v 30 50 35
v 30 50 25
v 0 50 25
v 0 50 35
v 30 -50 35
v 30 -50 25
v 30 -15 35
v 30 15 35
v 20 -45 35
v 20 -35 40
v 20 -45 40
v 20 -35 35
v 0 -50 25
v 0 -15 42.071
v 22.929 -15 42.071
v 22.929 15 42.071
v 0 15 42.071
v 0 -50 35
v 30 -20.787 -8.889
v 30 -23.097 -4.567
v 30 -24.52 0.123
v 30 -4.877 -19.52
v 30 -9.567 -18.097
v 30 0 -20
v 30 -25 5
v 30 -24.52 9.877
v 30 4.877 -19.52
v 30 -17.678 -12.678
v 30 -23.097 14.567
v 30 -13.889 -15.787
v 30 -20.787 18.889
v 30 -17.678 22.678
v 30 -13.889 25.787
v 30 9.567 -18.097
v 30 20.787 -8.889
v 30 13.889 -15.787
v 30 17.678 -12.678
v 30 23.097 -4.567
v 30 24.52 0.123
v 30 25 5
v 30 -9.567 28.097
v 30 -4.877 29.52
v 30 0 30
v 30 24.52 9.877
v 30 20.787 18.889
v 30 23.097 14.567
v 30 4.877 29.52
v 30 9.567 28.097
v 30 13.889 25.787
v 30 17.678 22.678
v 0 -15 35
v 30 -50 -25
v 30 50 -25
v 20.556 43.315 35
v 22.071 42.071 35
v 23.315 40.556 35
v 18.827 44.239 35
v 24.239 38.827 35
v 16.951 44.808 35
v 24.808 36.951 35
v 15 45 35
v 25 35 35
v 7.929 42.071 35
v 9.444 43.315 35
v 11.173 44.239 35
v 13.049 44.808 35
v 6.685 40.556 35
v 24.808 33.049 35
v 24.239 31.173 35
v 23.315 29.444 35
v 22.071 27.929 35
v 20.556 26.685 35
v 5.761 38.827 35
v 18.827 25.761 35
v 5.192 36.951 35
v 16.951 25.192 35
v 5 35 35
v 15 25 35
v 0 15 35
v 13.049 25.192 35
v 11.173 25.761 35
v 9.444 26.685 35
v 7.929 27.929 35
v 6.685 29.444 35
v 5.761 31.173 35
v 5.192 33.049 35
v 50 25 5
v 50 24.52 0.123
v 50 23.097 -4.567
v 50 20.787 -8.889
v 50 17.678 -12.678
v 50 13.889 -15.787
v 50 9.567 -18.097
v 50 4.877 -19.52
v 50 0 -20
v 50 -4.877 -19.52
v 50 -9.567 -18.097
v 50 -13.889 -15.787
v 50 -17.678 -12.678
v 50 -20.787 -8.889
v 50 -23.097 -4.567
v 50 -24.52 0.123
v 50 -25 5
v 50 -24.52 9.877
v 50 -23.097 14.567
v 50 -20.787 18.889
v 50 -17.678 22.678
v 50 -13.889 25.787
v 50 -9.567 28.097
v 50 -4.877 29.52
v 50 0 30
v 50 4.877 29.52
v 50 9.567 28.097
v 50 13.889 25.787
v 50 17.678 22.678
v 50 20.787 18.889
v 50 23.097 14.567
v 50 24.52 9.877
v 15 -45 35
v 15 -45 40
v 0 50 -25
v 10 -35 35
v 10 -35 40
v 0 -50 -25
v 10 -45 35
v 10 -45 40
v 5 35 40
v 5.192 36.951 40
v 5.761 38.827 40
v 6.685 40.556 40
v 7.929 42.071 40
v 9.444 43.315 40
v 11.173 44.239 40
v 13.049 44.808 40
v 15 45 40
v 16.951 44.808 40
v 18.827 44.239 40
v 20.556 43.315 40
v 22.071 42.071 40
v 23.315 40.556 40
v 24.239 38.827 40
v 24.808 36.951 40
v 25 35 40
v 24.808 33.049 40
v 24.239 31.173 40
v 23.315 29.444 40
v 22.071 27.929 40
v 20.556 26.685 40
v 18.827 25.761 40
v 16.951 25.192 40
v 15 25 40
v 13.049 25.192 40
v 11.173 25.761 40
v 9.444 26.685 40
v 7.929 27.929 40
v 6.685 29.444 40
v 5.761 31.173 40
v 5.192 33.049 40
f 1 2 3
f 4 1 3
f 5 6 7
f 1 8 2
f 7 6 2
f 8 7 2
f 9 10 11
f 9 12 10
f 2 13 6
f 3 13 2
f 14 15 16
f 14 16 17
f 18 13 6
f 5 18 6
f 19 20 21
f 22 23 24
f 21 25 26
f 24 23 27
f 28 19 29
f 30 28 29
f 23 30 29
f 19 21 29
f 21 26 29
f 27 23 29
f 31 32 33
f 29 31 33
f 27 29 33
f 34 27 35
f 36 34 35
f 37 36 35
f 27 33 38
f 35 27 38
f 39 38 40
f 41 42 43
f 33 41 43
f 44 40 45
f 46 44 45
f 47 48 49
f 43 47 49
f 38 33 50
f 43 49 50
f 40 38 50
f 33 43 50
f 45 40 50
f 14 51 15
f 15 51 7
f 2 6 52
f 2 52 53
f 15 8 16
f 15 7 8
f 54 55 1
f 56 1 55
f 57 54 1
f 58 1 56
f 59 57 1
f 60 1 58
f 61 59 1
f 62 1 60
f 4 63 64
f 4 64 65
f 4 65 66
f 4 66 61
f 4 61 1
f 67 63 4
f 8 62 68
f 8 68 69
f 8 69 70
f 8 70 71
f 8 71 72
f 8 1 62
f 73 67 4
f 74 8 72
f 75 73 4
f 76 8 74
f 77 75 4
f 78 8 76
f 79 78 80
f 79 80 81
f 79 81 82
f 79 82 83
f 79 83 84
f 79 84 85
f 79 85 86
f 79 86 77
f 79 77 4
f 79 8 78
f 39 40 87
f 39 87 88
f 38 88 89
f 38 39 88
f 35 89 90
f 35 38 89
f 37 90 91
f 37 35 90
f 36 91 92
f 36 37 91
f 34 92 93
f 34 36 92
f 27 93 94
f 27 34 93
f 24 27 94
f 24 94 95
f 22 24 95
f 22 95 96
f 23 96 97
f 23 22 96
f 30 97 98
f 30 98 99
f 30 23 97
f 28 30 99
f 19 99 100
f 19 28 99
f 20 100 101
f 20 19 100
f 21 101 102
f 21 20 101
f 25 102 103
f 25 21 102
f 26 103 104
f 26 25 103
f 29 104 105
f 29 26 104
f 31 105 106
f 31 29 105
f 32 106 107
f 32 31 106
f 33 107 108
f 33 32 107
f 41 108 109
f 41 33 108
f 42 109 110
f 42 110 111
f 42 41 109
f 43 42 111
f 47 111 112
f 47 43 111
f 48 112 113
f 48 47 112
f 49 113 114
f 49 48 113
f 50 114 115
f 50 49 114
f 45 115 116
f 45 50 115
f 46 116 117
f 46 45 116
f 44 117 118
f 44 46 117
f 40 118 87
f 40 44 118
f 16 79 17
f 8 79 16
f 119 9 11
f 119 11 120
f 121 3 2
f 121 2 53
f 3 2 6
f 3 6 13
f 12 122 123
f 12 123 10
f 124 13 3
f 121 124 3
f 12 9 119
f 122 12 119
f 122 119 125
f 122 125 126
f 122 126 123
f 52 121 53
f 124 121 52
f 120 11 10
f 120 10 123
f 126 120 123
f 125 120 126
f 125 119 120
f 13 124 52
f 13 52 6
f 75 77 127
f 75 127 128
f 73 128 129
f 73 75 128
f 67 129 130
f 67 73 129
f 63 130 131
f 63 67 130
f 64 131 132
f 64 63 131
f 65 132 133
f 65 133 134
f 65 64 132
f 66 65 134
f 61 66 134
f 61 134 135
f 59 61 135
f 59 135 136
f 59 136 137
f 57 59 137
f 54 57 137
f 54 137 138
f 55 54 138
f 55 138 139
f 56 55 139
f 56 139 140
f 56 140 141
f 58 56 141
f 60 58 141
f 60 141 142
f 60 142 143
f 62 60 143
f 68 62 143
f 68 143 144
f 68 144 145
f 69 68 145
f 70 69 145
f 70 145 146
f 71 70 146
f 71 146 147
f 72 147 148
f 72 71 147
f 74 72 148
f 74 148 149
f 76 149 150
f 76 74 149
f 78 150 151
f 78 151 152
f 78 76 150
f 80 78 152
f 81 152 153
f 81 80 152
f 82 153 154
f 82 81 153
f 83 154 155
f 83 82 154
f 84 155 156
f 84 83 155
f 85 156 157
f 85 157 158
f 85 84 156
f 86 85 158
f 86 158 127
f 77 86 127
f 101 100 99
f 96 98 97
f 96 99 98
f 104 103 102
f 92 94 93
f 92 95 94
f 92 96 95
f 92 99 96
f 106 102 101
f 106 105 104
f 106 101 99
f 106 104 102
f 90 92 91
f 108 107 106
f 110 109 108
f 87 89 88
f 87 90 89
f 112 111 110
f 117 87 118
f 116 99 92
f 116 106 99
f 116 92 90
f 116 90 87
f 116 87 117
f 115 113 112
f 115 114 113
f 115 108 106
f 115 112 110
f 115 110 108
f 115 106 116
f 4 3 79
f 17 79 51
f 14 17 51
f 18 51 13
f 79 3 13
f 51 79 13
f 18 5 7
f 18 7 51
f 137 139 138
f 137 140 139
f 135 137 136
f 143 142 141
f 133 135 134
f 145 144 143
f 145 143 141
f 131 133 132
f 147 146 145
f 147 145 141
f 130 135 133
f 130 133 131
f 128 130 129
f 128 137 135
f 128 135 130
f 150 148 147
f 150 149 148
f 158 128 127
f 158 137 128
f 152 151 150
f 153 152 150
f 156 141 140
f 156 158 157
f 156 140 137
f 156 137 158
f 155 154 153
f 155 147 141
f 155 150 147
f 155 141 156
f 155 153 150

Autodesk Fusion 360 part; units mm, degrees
sketch "Sketch1" plane through (0, 0, 0) normal (1, 0, 0) x (0, 1, 0)
  line L0 (50, -25) -> (-50, -25)
  line L1 (-50, -25) -> (-50, 25)
  line L2 (-50, 25) -> (50, 25)
  line L3 (50, 25) -> (50, -25)
  line L4 (50, -25) -> (-50, 25) construction
  line L5 (-50, -25) -> (50, 25) construction
  dimension "d1" = 100
  dimension "d2" = 50
extrude "Extrude1" add sketch "Sketch1" along normal blind 30 makes body 1
sketch "Sketch2" plane through (0, 0, 25) normal (0, 0, 1) x (-1, 0, 0)
  line L0 (0, -50) -> (0, 50)
  line L1 (0, 50) -> (-30, 50)
  line L2 (-30, 50) -> (-30, -50)
  line L3 (-30, -50) -> (0, -50)
  line L4 (0, 50) -> (-15, 50)
  line L5 (-15, 50) -> (-15, 0)
  line L6 (-30, 50) -> (0, 50)
  line L7 (0, 50) -> (0, -50)
  line L8 (0, -50) -> (-30, -50)
  line L9 (-30, -50) -> (-30, 50)
  line L10 (-30, 50) -> (0, -50) construction
  line L11 (0, 50) -> (-30, -50) construction
  point P0 (-15, 0)
extrude "Extrude2" add sketch "Sketch2" along normal blind 10 separate body makes body 2
sketch "Sketch3" plane through (30, 0, 0) normal (1, 0, 0) x (0, 1, 0)
  line L0 (50, 25) -> (-50, 25)
  line L1 (-50, 25) -> (-50, -25)
  line L2 (-50, -25) -> (50, -25)
  line L3 (50, -25) -> (50, 25)
  line L4 (-50, 35) -> (-50, 5)
  line L5 (-50, 35) -> (0, 35)
  circle A0 centre (0, 5) radius 25
  dimension "d7" = 30
  dimension "d8" = 50
extrude "Extrude3" add sketch "Sketch3" along normal blind 20 separate body contours L0 A0 | L0 A0 makes body 3
sketch "Sketch4" plane through (0, 0, 35) normal (0, 0, 1) x (-1, 0, 0)
  line L0 (-30, -50) -> (0, -50)
  line L1 (0, -50) -> (0, 50)
  line L2 (0, 50) -> (-30, 50)
  line L3 (-30, 50) -> (-30, -50)
  line L4 (0, 50) -> (-15, 50)
  line L5 (-15, 50) -> (-15, 40)
  line L6 (-10, 35) -> (-20, 35)
  line L7 (-20, 35) -> (-20, 45)
  line L8 (-20, 45) -> (-10, 45)
  line L9 (-10, 45) -> (-10, 35)
  point P0 (-15, 40)
  dimension "d11" = 10
  dimension "d12" = 10
  dimension "d13" = 10
extrude "Extrude4" add sketch "Sketch4" along normal blind 5 separate body contours L6 L7 L8 L9 makes body 4
sketch "Sketch5" plane through (0, 0, 35) normal (0, 0, 1) x (-1, 0, 0)
  line L0 (-30, -50) -> (0, -50)
  line L1 (0, -50) -> (0, 50)
  line L2 (0, 50) -> (-30, 50)
  line L3 (-30, 50) -> (-30, -50)
  line L4 (-30, -50) -> (-15, -50)
  line L5 (-15, -50) -> (-15, -35)
  circle A0 centre (-15, -35) radius 10
  dimension "d16" = 15
  dimension "d17" = 20
extrude "Extrude5" add sketch "Sketch5" along normal blind 5 contours A0 bodies 2
ref_plane "WorkPlane1" through (15, 0, 0) normal (0, 1, 0) x (0, 0, 1)
sketch "Sketch6" plane through (0, 0, 0) normal (0, 1, 0) x (1, 0, 0)
ref_plane "WorkPlane2" through (15, 0, 0) normal (0, 1, 0) x (0, 0, 1)
sketch "Sketch7" plane through (0, 0, 0) normal (0, 1, 0) x (1, 0, 0)
  line L0 (30, -35) -> (22.9289, -42.0711)
  line L1 (30, -35) -> (40, -35) construction
  line L2 (22.9289, -42.0711) -> (0, -42.0711)
  line L3 (0, -42.0711) -> (0, -35)
  line L4 (0, -35) -> (30, -35)
  dimension "d20" = 135
  dimension "d21" = 10
extrude "Extrude6" add sketch "Sketch7" along normal blind 15 and the other way blind 15 bodies 2
